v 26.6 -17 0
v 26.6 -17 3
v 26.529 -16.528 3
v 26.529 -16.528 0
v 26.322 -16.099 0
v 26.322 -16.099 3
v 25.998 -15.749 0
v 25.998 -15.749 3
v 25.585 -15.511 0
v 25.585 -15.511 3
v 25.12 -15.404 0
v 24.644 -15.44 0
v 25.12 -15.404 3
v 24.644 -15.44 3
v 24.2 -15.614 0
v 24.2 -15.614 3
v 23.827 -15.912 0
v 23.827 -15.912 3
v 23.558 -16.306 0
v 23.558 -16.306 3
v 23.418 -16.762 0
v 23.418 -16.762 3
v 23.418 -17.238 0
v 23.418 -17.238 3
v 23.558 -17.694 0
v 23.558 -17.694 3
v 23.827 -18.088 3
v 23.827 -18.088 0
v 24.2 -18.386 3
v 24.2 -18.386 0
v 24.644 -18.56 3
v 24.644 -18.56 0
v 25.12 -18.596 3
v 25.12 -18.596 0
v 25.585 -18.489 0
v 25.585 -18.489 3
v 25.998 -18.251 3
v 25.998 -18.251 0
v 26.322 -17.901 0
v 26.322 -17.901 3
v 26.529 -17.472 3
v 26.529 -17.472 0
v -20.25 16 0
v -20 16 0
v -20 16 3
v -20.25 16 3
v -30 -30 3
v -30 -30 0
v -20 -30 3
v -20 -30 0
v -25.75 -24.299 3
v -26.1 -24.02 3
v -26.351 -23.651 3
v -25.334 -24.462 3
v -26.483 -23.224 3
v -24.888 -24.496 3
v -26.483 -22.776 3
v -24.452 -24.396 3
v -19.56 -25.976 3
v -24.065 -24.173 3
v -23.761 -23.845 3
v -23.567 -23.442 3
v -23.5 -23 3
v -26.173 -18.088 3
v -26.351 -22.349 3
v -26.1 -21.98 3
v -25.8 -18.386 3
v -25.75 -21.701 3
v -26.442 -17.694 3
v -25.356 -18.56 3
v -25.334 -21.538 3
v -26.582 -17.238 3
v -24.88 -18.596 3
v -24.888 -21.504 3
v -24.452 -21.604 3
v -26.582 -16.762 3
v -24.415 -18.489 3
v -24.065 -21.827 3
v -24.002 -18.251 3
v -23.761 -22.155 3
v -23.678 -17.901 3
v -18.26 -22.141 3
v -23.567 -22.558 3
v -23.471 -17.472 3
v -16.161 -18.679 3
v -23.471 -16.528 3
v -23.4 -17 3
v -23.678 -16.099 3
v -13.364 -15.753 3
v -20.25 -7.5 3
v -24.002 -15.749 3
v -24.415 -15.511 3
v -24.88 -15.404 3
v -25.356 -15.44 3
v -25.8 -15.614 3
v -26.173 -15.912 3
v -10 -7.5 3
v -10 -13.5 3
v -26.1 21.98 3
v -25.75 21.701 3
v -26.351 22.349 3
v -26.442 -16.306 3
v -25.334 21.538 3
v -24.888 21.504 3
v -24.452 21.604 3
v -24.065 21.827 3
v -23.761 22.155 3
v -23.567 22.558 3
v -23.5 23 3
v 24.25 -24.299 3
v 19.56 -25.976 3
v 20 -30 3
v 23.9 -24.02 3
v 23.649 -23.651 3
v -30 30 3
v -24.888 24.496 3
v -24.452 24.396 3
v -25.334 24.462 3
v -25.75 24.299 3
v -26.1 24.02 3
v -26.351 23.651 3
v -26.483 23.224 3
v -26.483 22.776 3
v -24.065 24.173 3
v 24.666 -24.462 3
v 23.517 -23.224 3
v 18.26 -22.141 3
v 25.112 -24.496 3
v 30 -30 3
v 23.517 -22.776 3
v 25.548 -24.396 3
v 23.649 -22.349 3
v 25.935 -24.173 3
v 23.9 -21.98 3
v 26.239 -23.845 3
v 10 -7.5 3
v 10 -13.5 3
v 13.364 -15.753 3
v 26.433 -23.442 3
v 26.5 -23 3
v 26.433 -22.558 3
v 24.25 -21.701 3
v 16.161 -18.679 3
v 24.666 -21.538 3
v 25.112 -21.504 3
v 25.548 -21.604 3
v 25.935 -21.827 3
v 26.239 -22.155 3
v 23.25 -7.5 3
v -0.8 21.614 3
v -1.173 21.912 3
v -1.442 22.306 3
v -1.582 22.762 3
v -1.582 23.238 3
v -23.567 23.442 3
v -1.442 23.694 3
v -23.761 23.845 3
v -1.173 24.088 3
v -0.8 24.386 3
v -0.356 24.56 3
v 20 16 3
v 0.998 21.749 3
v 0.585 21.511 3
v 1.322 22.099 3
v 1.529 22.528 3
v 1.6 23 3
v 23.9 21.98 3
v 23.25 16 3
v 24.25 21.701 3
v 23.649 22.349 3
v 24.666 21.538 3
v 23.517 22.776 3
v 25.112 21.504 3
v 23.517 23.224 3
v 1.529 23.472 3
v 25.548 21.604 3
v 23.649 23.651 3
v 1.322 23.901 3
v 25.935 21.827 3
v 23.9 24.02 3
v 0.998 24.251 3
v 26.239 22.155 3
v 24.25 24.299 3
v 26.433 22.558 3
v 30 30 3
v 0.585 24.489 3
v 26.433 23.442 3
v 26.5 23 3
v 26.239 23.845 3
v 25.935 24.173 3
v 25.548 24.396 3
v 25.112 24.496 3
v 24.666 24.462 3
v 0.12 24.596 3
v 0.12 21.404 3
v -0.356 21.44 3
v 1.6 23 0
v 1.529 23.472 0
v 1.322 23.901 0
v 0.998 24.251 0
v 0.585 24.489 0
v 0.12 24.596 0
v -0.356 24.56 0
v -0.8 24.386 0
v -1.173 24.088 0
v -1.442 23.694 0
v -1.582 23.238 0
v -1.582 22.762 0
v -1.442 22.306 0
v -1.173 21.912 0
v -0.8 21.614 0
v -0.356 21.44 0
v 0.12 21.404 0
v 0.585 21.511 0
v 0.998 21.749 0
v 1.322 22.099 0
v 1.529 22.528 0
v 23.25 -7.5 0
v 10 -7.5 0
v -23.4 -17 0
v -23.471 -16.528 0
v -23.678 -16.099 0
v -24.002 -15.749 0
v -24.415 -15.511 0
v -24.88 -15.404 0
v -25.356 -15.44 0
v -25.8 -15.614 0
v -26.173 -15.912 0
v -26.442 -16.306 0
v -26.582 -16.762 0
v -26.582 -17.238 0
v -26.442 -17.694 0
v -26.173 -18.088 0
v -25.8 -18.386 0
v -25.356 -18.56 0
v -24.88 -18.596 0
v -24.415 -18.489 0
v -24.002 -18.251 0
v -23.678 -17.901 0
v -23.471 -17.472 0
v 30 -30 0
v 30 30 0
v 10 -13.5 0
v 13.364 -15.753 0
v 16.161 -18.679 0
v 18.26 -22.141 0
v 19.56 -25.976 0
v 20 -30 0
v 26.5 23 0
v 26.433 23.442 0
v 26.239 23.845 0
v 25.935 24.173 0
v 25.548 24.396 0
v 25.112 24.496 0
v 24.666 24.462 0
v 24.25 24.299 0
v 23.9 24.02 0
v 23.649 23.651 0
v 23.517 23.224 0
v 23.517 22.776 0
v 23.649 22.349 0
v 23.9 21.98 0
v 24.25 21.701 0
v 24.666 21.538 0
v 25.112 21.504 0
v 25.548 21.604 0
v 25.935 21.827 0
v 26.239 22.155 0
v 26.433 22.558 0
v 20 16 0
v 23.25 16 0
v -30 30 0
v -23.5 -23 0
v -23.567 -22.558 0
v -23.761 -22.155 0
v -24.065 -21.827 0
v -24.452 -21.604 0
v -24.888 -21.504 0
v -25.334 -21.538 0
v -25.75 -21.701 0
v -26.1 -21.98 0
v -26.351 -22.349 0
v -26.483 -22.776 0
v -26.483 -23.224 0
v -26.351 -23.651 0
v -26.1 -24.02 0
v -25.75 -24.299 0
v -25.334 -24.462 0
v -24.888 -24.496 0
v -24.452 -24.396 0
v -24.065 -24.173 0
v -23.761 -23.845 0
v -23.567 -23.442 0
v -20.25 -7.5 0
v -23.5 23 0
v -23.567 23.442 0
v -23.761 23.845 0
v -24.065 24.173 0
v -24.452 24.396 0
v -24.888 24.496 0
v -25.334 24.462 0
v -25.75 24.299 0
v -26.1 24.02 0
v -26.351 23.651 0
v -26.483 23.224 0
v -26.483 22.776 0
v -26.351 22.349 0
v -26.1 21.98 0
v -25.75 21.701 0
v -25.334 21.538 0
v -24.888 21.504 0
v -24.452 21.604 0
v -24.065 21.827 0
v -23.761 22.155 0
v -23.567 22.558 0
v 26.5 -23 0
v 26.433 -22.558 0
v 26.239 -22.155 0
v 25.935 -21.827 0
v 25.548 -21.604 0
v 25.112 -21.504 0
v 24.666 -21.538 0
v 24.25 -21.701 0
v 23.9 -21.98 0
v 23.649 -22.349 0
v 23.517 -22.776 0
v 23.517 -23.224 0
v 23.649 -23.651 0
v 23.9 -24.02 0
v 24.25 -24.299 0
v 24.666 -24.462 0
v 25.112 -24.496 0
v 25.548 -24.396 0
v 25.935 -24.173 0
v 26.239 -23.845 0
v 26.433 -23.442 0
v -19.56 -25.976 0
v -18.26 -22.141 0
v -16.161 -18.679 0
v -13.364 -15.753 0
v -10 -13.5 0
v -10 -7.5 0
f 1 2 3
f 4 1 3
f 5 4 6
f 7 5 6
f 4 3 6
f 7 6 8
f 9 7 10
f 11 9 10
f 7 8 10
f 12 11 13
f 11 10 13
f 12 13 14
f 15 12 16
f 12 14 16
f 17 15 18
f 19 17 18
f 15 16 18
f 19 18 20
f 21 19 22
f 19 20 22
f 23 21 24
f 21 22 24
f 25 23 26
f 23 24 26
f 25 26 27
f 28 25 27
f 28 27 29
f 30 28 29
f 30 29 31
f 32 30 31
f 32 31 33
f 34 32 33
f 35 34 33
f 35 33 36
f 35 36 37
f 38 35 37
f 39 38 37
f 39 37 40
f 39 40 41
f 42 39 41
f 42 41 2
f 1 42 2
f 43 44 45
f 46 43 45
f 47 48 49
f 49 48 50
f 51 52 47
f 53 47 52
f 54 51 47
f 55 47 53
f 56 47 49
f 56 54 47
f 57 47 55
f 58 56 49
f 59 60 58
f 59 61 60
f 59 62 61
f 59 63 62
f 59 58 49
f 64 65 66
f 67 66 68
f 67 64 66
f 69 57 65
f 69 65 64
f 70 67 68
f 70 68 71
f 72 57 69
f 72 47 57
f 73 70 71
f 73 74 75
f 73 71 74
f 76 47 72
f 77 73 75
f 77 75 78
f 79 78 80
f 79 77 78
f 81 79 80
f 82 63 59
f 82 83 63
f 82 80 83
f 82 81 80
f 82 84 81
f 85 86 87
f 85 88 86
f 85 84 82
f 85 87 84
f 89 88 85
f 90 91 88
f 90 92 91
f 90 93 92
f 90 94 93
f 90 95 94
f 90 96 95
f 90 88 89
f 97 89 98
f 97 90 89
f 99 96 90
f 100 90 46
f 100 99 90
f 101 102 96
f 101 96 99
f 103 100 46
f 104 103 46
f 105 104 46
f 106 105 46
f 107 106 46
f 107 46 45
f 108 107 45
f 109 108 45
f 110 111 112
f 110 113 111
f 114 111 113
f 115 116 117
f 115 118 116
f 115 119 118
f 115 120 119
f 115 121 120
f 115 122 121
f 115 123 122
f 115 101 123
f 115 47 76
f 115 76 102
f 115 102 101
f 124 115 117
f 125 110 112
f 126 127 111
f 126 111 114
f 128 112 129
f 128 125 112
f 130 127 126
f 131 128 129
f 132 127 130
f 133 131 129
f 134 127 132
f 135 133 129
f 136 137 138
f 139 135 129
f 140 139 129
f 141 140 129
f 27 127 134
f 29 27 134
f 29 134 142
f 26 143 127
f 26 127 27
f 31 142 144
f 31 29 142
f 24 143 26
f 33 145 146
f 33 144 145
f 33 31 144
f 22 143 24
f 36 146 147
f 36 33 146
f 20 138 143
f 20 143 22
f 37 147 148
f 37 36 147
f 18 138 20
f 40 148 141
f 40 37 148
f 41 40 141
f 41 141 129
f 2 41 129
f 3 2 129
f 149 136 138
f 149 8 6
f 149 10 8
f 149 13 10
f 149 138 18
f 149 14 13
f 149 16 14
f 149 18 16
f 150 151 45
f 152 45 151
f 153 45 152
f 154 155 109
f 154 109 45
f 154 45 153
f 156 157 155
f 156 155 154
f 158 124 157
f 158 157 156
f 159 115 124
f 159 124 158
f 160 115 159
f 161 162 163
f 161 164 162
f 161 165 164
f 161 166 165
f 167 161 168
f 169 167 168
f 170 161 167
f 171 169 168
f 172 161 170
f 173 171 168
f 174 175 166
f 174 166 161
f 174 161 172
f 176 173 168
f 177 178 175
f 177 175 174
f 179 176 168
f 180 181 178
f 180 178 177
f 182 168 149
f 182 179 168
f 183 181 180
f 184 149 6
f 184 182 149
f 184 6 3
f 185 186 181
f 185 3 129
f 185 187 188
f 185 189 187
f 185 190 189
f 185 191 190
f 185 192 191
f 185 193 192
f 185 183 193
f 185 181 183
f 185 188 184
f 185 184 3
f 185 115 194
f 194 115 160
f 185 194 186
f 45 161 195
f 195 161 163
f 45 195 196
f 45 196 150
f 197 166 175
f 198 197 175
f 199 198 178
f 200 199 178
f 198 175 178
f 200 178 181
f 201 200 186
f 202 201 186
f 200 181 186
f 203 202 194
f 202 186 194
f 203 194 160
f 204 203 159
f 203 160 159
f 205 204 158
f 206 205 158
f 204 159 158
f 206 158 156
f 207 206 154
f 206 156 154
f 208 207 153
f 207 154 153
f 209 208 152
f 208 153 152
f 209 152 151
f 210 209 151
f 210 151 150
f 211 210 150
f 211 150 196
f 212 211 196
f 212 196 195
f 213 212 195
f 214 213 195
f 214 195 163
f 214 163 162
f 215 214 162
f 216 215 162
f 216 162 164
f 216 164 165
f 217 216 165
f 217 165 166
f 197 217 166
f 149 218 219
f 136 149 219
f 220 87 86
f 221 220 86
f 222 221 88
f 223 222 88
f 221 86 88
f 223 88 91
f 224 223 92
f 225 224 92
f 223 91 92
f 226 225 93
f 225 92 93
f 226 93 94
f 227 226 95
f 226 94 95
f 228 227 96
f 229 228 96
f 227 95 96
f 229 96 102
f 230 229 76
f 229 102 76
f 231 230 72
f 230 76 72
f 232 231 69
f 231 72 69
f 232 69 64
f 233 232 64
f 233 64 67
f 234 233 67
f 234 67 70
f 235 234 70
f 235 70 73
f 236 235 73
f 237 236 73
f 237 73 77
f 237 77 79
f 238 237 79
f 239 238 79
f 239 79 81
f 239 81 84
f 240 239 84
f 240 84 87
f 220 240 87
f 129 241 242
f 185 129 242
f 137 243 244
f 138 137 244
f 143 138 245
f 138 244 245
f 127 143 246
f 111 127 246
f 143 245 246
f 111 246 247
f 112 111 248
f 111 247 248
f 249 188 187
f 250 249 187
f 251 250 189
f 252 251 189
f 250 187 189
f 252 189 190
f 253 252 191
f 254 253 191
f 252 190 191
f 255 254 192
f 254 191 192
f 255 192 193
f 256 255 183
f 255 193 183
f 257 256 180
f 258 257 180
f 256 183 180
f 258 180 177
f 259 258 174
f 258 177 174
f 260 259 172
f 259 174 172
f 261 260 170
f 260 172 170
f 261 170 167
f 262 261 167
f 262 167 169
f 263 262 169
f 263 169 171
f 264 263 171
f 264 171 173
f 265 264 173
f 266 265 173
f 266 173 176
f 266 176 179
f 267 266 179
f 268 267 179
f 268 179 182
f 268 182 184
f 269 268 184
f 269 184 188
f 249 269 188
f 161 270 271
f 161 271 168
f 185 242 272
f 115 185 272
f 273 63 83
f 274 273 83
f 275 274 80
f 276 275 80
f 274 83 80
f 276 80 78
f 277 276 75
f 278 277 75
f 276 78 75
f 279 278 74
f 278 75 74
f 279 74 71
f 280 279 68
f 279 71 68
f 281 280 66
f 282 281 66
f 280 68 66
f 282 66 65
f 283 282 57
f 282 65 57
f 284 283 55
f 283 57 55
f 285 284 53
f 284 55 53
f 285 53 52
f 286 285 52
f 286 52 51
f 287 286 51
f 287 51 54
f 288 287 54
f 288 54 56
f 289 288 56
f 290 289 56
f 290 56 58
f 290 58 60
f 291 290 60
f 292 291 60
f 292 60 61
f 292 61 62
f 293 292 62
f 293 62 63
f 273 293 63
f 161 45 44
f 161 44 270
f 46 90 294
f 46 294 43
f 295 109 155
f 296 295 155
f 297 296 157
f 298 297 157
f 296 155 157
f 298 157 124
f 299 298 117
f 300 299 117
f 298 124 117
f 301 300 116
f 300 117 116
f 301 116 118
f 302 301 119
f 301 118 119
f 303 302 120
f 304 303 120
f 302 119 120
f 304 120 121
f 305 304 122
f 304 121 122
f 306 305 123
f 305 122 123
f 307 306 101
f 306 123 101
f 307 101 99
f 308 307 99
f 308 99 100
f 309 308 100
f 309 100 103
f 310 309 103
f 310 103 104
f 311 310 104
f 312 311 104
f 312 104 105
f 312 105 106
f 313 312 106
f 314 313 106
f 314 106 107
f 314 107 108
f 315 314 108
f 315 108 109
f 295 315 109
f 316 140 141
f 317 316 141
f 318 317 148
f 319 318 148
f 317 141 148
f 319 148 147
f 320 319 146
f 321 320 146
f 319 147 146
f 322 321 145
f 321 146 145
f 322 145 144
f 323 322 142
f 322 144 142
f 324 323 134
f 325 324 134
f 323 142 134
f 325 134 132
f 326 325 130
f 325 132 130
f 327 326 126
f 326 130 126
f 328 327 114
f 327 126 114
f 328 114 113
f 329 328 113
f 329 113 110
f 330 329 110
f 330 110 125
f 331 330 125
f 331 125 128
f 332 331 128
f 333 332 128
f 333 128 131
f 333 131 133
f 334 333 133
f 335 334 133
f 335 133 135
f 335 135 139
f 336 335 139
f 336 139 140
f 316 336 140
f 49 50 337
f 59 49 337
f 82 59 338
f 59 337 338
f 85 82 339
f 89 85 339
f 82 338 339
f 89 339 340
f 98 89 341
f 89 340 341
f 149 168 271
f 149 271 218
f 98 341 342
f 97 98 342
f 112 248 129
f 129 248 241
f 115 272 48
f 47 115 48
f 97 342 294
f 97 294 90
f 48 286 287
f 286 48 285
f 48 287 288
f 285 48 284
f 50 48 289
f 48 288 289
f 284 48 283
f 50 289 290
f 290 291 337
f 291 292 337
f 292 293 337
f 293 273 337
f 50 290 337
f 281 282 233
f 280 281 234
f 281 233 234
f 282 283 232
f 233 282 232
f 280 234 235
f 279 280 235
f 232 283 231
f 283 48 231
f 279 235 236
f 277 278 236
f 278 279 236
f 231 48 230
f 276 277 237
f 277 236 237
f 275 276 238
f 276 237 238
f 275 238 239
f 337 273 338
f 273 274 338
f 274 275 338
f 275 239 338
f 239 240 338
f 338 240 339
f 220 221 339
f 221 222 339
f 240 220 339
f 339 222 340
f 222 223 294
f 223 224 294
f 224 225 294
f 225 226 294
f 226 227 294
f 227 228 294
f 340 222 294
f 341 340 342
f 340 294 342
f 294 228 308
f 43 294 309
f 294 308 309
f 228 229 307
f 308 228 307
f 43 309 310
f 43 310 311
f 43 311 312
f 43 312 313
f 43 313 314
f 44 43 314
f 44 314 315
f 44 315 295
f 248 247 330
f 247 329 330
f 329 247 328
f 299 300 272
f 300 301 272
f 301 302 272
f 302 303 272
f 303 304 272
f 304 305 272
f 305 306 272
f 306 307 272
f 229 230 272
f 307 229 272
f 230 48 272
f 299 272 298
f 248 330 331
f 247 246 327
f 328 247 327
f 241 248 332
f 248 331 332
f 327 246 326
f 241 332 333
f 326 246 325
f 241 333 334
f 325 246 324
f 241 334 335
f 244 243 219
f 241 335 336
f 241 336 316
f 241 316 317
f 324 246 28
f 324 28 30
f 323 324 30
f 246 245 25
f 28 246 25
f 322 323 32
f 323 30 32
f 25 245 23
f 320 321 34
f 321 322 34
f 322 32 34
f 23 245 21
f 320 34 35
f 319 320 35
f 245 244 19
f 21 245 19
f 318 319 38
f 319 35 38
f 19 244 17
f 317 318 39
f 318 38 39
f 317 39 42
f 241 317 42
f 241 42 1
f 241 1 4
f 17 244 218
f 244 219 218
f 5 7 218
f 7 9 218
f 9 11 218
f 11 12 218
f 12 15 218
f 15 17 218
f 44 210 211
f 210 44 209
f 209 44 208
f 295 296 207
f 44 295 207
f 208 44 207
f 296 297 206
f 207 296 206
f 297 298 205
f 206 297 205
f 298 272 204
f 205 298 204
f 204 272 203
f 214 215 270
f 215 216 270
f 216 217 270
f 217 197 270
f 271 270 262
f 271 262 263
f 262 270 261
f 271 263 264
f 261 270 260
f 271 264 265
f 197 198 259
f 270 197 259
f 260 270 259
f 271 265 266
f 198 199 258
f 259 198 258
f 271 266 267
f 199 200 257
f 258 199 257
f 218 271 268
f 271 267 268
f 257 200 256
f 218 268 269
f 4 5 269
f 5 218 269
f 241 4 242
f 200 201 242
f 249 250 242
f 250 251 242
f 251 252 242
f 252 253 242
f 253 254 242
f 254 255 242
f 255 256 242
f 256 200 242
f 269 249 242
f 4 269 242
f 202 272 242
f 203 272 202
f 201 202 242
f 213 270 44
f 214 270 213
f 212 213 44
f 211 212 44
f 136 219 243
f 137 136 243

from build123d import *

# Parameters (mm, degrees)
F1_DEPTH  = 3
F2_R      = 1.5
F3_DEPTH  = 3.001
F4_R      = 1.6
F5_DEPTH  = 3.001
F6_W      = 40
F6_H      = 3
F7_DEPTH  = 0.5
F8_W      = 23.5
F8_H      = 3
F9_DEPTH  = 0.25
F10_W     = 23.5000022292
F10_H     = 3
F11_DEPTH = 0.25
F12_W     = 23.5000022292
F12_H     = 3
F13_DEPTH = 3


with BuildPart() as f1:
    # F0 (on Top) → F1 (new body)
    with BuildSketch(Plane.XY):
        Polygon((30, -30), (30, 30), (-30, 30), (-30, -30), (-20, -30), (-20, -15.5000011146), (-19.9802070856, -13.5000011146), (-10, -13.5000011146), (-10, -7.5000011146), (-20, -7.5000011146), (-20, 15.4999988854), (20, 15.5000011146), (20, -7.5000011146), (10, -7.5000011146), (10, -13.5000011146), (20, -13.5000011146), (20, -15.4999988854), (20, -30), align=None)
        with BuildLine():
            Line((-20, -15.5000011146), (-20, -30))
            ThreePointArc((-20, -30), (-17.3048696173, -20.3531097858), (-10, -13.5000011146))
            Line((-10, -13.5000011146), (-19.9802070856, -13.5000011146))
            Line((-19.9802070856, -13.5000011146), (-20, -15.5000011146))
        make_face()
        with BuildLine():
            ThreePointArc((10, -13.5000011146), (17.3048696173, -20.3531097858), (20, -30))
            Line((20, -30), (20, -15.4999988854))
            Line((20, -15.4999988854), (20, -13.5000011146))
            Line((20, -13.5000011146), (10, -13.5000011146))
        make_face()
    extrude(amount=F1_DEPTH)

    # F2 (on face) → F3 (cut, through all)
    with BuildSketch(Plane.XY.offset(3)):
        with Locations((-25, 23)):
            Circle(F2_R)
        with Locations((25, 23)):
            Circle(F2_R)
        with Locations((-25, -23)):
            Circle(F2_R)
        with Locations((25, -23)):
            Circle(F2_R)
    extrude(amount=-F3_DEPTH, mode=Mode.SUBTRACT)

    # F4 (on face) → F5 (cut, through all)
    with BuildSketch(Plane.XY.offset(3)):
        with Locations((25, -17)):
            Circle(F4_R)
        with Locations((-25, -17)):
            Circle(F4_R)
        with Locations((0, 23)):
            Circle(F4_R)
    extrude(amount=-F5_DEPTH, mode=Mode.SUBTRACT)

    # F6 (on face) → F7 (cut)
    with BuildSketch(Plane(origin=(-8.638e-07, 15.5, 0), x_dir=(1, 5.57e-08, 0), z_dir=(5.57e-08, -1, 0))):
        with Locations((8.638e-07, 1.5)):
            Rectangle(F6_W, F6_H)
    extrude(amount=-F7_DEPTH, mode=Mode.SUBTRACT)

    # F8 (on face) → F9 (cut)
    with BuildSketch(Plane.YZ.offset(-20)):
        with Locations((4.2499988854, 1.5)):
            Rectangle(F8_W, F8_H)
    extrude(amount=-F9_DEPTH, mode=Mode.SUBTRACT)

    # F10 (on face) → F11 (cut)
    with BuildSketch(Plane(origin=(20, 0, 0), x_dir=(0, -1, 0), z_dir=(-1, 0, 0))):
        with Locations((-4.25, 1.5)):
            Rectangle(F10_W, F10_H)
    extrude(amount=-F11_DEPTH, mode=Mode.SUBTRACT)

    # F12 (on face) → F13 (cut)
    with BuildSketch(Plane(origin=(20.25, 0, 0), x_dir=(0, -1, 0), z_dir=(-1, 0, 0))):
        with Locations((-4.25, 1.5)):
            Rectangle(F12_W, F12_H)
    extrude(amount=-F13_DEPTH, mode=Mode.SUBTRACT)


solid = f1.part
